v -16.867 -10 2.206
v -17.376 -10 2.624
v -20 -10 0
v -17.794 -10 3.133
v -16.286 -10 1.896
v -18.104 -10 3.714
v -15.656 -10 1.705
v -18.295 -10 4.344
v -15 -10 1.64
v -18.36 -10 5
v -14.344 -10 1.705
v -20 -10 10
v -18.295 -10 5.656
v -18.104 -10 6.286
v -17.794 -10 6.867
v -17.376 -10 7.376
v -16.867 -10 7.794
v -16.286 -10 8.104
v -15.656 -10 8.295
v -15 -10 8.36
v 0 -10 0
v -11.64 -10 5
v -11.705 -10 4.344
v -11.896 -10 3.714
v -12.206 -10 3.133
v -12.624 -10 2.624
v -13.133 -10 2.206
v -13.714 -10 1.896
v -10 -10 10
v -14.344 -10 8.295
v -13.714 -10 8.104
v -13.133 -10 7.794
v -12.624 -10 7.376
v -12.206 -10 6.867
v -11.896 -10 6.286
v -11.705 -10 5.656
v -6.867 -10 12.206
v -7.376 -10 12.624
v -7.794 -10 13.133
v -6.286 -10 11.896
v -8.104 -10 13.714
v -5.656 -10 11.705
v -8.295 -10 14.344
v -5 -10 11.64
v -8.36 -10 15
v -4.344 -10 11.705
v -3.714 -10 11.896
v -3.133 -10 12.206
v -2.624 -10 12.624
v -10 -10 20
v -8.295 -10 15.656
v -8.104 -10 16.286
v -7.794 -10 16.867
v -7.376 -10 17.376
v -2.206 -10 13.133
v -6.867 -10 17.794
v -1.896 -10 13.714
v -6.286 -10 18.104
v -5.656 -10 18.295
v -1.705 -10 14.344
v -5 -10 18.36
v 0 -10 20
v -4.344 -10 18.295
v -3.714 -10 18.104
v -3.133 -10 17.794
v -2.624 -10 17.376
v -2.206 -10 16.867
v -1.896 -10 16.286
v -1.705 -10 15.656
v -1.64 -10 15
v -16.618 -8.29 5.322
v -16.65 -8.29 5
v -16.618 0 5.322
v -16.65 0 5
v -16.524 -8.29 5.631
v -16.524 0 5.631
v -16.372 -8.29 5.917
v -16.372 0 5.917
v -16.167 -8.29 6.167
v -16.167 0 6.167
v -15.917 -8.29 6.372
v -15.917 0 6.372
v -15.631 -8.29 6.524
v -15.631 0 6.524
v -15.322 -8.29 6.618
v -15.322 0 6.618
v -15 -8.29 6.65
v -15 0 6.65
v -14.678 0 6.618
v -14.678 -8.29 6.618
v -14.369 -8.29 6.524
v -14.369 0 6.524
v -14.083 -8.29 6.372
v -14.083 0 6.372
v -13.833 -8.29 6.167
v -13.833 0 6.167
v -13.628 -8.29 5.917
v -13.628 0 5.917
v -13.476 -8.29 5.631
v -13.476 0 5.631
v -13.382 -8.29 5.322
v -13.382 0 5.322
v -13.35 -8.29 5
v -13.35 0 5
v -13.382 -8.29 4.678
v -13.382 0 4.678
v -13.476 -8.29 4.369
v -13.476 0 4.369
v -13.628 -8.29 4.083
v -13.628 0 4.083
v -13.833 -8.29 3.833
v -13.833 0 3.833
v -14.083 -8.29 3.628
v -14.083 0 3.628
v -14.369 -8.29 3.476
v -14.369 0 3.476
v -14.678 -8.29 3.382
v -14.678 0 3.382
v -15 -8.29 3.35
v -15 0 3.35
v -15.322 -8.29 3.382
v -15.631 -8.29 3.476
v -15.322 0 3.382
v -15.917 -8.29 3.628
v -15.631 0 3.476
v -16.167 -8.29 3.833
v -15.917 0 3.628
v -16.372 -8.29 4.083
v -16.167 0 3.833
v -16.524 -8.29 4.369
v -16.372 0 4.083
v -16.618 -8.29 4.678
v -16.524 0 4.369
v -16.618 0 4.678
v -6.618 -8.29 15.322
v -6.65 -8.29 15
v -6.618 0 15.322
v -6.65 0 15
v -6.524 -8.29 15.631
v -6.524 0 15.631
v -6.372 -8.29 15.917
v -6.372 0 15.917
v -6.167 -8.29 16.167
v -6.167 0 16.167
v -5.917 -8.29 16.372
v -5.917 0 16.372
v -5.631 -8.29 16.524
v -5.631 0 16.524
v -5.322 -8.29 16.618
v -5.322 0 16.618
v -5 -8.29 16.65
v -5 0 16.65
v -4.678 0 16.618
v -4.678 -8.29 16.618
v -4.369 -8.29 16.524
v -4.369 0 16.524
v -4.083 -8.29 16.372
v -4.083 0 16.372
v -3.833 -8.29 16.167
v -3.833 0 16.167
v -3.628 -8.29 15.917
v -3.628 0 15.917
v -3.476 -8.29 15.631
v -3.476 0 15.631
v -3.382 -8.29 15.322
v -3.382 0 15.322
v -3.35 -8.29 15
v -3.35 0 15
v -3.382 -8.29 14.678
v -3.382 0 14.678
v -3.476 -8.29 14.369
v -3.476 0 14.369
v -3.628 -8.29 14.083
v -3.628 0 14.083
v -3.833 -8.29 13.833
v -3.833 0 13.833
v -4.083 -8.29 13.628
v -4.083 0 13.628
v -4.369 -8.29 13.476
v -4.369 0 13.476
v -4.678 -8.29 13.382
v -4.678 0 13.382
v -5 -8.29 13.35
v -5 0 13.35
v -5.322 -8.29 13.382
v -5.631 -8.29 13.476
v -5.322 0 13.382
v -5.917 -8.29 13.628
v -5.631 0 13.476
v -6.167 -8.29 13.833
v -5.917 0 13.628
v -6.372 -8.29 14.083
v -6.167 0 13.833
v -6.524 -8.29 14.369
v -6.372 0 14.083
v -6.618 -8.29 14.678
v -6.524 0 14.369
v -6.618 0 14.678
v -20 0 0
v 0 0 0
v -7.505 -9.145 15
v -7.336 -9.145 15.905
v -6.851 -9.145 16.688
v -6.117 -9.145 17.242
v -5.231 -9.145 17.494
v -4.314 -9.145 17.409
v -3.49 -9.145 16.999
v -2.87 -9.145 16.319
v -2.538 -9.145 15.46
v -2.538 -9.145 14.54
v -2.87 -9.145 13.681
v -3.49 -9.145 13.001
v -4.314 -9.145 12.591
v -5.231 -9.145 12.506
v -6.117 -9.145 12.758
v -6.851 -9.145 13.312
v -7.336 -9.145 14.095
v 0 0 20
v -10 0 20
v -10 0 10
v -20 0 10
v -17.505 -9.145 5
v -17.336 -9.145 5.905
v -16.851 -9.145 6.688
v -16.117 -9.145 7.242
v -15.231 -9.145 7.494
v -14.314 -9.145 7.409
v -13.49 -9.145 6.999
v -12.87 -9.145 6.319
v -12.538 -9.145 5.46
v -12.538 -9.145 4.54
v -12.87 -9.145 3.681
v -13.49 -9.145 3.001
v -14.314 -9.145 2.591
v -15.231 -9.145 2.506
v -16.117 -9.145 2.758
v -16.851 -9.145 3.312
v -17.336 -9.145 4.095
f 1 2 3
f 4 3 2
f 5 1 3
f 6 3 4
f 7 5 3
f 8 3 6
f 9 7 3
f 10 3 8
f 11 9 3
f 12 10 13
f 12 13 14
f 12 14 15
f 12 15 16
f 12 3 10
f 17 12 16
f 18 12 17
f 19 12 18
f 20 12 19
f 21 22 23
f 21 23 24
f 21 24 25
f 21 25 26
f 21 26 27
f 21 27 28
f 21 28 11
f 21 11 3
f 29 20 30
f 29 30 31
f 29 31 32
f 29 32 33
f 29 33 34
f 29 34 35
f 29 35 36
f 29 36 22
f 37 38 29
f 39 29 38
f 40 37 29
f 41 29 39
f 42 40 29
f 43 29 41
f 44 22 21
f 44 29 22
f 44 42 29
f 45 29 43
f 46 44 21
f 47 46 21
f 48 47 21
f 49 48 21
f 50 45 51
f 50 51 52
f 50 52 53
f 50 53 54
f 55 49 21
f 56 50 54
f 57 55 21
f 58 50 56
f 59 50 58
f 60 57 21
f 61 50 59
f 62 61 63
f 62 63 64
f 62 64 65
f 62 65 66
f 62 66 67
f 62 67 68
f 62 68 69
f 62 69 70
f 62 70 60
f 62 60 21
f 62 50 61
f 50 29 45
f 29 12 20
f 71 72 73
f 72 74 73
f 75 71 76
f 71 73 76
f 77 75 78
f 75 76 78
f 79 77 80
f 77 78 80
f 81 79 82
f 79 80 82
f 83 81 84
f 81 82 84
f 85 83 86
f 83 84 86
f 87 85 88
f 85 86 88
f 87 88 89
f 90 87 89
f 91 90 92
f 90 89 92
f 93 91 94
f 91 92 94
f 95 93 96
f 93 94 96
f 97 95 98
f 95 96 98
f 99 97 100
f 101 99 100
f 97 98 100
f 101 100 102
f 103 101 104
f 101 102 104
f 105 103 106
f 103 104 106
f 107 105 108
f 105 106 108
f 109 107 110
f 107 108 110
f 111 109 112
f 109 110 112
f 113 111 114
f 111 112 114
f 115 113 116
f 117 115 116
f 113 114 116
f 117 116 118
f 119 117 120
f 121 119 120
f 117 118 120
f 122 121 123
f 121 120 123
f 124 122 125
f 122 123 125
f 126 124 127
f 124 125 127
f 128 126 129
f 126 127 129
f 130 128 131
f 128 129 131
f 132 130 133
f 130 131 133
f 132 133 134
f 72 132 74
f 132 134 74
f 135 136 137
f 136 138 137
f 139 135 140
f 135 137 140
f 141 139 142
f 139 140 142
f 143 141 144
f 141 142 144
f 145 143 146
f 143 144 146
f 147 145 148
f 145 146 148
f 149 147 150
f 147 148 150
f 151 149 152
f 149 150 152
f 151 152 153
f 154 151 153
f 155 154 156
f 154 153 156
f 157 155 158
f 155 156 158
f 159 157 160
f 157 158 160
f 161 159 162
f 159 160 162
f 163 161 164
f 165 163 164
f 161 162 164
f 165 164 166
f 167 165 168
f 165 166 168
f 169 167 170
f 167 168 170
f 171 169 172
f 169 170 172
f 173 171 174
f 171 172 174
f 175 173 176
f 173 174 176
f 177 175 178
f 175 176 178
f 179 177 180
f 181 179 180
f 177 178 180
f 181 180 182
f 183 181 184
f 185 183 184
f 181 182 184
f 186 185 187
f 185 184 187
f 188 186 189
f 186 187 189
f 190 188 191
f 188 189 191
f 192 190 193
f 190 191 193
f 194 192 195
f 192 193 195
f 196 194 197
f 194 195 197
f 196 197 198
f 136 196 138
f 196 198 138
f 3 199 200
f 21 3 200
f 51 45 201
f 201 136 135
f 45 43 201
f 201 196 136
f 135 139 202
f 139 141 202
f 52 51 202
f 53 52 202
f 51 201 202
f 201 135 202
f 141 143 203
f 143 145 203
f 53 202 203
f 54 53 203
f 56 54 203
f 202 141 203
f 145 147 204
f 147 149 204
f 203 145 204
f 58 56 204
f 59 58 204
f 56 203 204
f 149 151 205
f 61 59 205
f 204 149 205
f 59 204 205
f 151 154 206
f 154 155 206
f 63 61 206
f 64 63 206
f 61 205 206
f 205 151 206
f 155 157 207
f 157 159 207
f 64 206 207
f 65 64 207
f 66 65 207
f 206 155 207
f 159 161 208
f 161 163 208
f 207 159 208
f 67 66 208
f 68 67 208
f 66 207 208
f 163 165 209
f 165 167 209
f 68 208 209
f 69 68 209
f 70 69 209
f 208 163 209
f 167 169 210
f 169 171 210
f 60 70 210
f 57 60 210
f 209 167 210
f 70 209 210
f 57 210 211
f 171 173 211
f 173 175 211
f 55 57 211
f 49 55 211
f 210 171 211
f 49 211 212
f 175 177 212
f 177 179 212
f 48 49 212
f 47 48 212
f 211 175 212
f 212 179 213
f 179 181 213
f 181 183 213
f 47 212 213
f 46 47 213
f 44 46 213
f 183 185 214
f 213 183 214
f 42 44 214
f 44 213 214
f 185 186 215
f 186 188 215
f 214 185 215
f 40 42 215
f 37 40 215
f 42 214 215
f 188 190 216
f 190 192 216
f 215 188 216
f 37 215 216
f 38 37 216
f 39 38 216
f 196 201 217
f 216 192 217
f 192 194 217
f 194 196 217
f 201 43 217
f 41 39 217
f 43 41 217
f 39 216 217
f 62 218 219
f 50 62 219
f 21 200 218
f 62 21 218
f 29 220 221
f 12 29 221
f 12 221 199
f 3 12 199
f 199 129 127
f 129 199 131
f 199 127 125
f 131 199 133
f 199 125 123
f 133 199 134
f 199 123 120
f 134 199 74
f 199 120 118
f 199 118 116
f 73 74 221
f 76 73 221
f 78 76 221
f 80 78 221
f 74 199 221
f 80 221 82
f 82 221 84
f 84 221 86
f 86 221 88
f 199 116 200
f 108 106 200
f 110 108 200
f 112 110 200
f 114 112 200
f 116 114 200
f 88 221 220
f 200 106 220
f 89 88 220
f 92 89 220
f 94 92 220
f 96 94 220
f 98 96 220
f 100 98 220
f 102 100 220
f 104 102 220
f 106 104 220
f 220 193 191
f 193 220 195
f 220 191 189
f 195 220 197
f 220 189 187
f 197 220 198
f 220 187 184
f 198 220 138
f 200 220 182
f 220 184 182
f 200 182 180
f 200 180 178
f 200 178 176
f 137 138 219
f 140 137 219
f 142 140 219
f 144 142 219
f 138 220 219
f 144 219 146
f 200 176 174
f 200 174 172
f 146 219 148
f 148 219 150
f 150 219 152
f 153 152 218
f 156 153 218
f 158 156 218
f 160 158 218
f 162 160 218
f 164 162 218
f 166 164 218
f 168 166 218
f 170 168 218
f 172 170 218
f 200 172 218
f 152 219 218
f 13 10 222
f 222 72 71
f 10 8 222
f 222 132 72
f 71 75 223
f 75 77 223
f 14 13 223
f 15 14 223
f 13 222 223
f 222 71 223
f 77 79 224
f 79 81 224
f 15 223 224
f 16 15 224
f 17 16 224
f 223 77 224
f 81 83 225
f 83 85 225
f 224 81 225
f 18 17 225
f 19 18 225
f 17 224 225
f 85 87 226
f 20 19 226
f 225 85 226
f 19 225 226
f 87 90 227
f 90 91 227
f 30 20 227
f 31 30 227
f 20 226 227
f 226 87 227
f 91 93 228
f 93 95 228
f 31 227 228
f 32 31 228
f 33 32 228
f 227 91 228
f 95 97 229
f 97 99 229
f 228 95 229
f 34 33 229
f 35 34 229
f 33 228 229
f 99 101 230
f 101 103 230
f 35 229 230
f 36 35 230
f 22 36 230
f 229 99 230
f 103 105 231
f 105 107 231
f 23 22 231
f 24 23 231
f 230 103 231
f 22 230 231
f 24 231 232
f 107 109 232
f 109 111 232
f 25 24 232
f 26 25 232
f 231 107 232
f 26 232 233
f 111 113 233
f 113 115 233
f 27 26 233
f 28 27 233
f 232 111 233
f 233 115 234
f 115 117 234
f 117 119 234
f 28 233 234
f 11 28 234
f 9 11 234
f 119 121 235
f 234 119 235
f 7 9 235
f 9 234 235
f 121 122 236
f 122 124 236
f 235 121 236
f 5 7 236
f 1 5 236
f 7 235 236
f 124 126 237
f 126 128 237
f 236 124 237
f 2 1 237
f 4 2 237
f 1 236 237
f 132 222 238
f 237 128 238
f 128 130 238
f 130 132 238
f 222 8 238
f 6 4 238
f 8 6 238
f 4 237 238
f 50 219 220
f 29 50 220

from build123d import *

# Parameters (mm, degrees)
F1_DEPTH       = 10
F3_D           = 3.3
F3_CSINK_D     = 6.72
F3_CSINK_ANGLE = 90


with BuildPart() as f1:
    # F0 (on Front) → F1 (new body)
    with BuildSketch(Plane.XZ):
        Polygon((0, 20), (-10, 20), (-10, 10), (-20, 10), (-20, 0), (0, 0), align=None)
    extrude(amount=F1_DEPTH)

    # F3 (through all)
    with Locations(Plane.XZ.offset(10)):
        with Locations((-5, 15), (-15, 5)):
            CounterSinkHole(F3_D / 2, F3_CSINK_D / 2, counter_sink_angle=F3_CSINK_ANGLE)


solid = f1.part
